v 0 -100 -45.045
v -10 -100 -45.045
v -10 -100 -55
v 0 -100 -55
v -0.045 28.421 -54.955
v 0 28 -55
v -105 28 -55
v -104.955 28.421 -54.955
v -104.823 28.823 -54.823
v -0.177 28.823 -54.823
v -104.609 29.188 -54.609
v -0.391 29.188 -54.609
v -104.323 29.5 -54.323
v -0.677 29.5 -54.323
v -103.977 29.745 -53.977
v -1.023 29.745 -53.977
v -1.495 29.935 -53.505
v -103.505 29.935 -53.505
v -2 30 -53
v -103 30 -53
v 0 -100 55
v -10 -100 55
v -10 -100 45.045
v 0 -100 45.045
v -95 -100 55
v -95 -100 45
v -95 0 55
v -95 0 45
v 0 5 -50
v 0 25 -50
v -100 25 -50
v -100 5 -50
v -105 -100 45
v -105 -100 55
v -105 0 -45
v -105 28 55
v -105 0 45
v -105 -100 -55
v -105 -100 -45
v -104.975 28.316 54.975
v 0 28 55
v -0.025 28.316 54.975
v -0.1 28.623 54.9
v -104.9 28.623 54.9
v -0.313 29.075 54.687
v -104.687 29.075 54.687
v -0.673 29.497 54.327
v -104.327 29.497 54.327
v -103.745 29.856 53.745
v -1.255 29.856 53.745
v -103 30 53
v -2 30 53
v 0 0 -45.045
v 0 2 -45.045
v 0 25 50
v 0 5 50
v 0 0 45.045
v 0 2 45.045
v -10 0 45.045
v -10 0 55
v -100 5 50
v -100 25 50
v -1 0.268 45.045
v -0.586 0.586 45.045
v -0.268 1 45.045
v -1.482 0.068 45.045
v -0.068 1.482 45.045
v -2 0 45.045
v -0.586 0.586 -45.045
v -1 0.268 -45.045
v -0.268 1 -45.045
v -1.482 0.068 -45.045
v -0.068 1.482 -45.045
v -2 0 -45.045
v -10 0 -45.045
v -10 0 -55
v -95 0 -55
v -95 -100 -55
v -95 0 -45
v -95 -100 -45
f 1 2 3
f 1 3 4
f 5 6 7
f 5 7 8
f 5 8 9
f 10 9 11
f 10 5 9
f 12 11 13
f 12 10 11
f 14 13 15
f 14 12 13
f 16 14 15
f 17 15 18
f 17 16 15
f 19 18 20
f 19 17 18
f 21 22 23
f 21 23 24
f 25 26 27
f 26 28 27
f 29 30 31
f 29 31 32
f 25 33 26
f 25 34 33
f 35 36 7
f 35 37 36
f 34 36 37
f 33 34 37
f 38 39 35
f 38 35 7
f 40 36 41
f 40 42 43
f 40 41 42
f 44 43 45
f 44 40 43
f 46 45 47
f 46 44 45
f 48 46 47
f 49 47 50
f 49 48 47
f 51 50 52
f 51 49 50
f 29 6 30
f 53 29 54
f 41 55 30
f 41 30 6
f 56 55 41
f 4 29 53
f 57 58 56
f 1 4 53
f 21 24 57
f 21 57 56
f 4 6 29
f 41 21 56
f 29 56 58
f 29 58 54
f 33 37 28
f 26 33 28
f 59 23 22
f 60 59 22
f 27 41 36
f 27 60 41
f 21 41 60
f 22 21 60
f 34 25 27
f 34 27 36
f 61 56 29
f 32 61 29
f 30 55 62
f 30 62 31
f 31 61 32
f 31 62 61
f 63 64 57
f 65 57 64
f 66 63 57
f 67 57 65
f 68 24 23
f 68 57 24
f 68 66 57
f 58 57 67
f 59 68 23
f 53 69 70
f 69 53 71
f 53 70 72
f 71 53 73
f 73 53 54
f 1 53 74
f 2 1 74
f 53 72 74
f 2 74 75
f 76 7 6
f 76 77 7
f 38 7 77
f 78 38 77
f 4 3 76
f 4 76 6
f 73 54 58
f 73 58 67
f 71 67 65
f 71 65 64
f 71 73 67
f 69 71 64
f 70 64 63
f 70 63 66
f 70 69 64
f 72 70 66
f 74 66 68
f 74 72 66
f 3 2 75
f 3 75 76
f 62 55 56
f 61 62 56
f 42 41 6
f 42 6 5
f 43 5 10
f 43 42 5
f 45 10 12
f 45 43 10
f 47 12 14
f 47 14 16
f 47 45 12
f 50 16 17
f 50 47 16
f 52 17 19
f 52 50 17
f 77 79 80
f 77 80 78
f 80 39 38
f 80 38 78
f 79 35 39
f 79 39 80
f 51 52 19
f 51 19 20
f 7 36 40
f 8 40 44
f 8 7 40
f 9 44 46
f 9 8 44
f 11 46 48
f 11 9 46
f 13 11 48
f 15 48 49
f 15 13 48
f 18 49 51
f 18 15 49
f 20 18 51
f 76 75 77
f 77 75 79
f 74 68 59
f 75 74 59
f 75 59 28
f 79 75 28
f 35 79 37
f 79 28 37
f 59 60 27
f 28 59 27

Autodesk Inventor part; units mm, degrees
ref_plane "YZ Plane" through (0, 0, 0) normal (1, 0, 0) x (0, 1, 0)
ref_plane "XZ Plane" through (0, 0, 0) normal (0, 1, 0) x (-1, 0, 0)
ref_plane "XY Plane" through (0, 0, 0) normal (0, 0, 1) x (1, 0, 0)
sketch "Boceto1" plane through (0, 0, 0) normal (0, 1, 0) x (-1, 0, 0)
  line L0 (0, 0) -> (0, -55)
  line L1 (0, -55) -> (0, 55)
  line L2 (0, 55) -> (105, 55)
  line L3 (105, 55) -> (105, -55)
  line L4 (105, -55) -> (0, -55)
  dimension "d0" = 55
  dimension "d1" = 110
  dimension "d2" = 105
  dimension "d3" = 110
extrude "Extrusión1" add sketch "Boceto1" along normal blind 30
sketch "Boceto2" plane through (0, 0, 55) normal (1, 0, 0) x (0, 0, -1)
  line L0 (0, 0) -> (0, 30) projected
  line L1 (0, 0) -> (0, 5)
  line L2 (0, 5) -> (110, 5)
  line L3 (110, 0) -> (110, 30) projected
  line L4 (110, 30) -> (0, 30) projected
  line L5 (0, 30) -> (0, 25)
  line L6 (0, 25) -> (110, 25)
  line L7 (0, 30) -> (5, 30)
  line L8 (5, 30) -> (5, 0)
  line L9 (110, 0) -> (0, 0) projected
  line L10 (110, 30) -> (105, 30)
  line L11 (105, 30) -> (105, 0)
  point P0 (55, 0)
  point P1 (105, 5)
  point P2 (105, 25)
  point P3 (5, 25)
  point P4 (5, 5)
  dimension "d6" = 5
  dimension "d7" = 5
  dimension "d9" = 110
  dimension "d10" = 5
  dimension "d11" = 5
extrude "Extrusión2" cut sketch "Boceto2" against normal blind 100 contours L8 L6 L11 L2
sketch "Boceto3" plane through (0, 0, 0) normal (0, -1, 0) x (1, 0, 0)
  line L0 (0, 55.0451) -> (0, 45.0451)
  line L1 (0, -50) -> (0, 50) projected
  line L2 (0, 45.0451) -> (-10, 45.0451)
  line L3 (-105, 55) -> (0, 55) projected
  line L4 (0, 55) -> (-10, 55)
  line L5 (-10, 45.0451) -> (-10, 55)
  line L6 (0, 0) -> (-105, 0)
  line L7 (-105, -55) -> (-105, 55) projected
  line L8 (-105, 55) -> (-105, 45)
  line L9 (-105, 45) -> (-95, 45)
  line L10 (-95, 45) -> (-95, 55)
  line L11 (-105, 55) -> (-95, 55)
  line L12 (0, -55.0451) -> (0, -45.0451)
  line L13 (0, -45.0451) -> (-10, -45.0451)
  line L14 (-105, -55) -> (0, -55)
  line L15 (-10, -45.0451) -> (-10, -55)
  line L16 (-105, 55) -> (-105, -55)
  line L17 (-105, -45) -> (-95, -45)
  line L18 (-95, -45) -> (-95, -55)
  dimension "d14" = 10
  dimension "d15" = 10
  dimension "d16" = 10
  dimension "d17" = 10
extrude "Extrusión3" add sketch "Boceto3" along normal blind 100 contours L0 L2 L5 L3 | L10 L9 L7 L3 | L1 L12 L14 L15 L13 | L17 L18 L14 L7
fillet "Empalme1" radius 2 5 edges at (-52.5, 30, 55) (-52.5, 30, -55) (-105, 30, 0) (0, 30, 0) (0, 0, 0)
properties part number "Base_carga"
